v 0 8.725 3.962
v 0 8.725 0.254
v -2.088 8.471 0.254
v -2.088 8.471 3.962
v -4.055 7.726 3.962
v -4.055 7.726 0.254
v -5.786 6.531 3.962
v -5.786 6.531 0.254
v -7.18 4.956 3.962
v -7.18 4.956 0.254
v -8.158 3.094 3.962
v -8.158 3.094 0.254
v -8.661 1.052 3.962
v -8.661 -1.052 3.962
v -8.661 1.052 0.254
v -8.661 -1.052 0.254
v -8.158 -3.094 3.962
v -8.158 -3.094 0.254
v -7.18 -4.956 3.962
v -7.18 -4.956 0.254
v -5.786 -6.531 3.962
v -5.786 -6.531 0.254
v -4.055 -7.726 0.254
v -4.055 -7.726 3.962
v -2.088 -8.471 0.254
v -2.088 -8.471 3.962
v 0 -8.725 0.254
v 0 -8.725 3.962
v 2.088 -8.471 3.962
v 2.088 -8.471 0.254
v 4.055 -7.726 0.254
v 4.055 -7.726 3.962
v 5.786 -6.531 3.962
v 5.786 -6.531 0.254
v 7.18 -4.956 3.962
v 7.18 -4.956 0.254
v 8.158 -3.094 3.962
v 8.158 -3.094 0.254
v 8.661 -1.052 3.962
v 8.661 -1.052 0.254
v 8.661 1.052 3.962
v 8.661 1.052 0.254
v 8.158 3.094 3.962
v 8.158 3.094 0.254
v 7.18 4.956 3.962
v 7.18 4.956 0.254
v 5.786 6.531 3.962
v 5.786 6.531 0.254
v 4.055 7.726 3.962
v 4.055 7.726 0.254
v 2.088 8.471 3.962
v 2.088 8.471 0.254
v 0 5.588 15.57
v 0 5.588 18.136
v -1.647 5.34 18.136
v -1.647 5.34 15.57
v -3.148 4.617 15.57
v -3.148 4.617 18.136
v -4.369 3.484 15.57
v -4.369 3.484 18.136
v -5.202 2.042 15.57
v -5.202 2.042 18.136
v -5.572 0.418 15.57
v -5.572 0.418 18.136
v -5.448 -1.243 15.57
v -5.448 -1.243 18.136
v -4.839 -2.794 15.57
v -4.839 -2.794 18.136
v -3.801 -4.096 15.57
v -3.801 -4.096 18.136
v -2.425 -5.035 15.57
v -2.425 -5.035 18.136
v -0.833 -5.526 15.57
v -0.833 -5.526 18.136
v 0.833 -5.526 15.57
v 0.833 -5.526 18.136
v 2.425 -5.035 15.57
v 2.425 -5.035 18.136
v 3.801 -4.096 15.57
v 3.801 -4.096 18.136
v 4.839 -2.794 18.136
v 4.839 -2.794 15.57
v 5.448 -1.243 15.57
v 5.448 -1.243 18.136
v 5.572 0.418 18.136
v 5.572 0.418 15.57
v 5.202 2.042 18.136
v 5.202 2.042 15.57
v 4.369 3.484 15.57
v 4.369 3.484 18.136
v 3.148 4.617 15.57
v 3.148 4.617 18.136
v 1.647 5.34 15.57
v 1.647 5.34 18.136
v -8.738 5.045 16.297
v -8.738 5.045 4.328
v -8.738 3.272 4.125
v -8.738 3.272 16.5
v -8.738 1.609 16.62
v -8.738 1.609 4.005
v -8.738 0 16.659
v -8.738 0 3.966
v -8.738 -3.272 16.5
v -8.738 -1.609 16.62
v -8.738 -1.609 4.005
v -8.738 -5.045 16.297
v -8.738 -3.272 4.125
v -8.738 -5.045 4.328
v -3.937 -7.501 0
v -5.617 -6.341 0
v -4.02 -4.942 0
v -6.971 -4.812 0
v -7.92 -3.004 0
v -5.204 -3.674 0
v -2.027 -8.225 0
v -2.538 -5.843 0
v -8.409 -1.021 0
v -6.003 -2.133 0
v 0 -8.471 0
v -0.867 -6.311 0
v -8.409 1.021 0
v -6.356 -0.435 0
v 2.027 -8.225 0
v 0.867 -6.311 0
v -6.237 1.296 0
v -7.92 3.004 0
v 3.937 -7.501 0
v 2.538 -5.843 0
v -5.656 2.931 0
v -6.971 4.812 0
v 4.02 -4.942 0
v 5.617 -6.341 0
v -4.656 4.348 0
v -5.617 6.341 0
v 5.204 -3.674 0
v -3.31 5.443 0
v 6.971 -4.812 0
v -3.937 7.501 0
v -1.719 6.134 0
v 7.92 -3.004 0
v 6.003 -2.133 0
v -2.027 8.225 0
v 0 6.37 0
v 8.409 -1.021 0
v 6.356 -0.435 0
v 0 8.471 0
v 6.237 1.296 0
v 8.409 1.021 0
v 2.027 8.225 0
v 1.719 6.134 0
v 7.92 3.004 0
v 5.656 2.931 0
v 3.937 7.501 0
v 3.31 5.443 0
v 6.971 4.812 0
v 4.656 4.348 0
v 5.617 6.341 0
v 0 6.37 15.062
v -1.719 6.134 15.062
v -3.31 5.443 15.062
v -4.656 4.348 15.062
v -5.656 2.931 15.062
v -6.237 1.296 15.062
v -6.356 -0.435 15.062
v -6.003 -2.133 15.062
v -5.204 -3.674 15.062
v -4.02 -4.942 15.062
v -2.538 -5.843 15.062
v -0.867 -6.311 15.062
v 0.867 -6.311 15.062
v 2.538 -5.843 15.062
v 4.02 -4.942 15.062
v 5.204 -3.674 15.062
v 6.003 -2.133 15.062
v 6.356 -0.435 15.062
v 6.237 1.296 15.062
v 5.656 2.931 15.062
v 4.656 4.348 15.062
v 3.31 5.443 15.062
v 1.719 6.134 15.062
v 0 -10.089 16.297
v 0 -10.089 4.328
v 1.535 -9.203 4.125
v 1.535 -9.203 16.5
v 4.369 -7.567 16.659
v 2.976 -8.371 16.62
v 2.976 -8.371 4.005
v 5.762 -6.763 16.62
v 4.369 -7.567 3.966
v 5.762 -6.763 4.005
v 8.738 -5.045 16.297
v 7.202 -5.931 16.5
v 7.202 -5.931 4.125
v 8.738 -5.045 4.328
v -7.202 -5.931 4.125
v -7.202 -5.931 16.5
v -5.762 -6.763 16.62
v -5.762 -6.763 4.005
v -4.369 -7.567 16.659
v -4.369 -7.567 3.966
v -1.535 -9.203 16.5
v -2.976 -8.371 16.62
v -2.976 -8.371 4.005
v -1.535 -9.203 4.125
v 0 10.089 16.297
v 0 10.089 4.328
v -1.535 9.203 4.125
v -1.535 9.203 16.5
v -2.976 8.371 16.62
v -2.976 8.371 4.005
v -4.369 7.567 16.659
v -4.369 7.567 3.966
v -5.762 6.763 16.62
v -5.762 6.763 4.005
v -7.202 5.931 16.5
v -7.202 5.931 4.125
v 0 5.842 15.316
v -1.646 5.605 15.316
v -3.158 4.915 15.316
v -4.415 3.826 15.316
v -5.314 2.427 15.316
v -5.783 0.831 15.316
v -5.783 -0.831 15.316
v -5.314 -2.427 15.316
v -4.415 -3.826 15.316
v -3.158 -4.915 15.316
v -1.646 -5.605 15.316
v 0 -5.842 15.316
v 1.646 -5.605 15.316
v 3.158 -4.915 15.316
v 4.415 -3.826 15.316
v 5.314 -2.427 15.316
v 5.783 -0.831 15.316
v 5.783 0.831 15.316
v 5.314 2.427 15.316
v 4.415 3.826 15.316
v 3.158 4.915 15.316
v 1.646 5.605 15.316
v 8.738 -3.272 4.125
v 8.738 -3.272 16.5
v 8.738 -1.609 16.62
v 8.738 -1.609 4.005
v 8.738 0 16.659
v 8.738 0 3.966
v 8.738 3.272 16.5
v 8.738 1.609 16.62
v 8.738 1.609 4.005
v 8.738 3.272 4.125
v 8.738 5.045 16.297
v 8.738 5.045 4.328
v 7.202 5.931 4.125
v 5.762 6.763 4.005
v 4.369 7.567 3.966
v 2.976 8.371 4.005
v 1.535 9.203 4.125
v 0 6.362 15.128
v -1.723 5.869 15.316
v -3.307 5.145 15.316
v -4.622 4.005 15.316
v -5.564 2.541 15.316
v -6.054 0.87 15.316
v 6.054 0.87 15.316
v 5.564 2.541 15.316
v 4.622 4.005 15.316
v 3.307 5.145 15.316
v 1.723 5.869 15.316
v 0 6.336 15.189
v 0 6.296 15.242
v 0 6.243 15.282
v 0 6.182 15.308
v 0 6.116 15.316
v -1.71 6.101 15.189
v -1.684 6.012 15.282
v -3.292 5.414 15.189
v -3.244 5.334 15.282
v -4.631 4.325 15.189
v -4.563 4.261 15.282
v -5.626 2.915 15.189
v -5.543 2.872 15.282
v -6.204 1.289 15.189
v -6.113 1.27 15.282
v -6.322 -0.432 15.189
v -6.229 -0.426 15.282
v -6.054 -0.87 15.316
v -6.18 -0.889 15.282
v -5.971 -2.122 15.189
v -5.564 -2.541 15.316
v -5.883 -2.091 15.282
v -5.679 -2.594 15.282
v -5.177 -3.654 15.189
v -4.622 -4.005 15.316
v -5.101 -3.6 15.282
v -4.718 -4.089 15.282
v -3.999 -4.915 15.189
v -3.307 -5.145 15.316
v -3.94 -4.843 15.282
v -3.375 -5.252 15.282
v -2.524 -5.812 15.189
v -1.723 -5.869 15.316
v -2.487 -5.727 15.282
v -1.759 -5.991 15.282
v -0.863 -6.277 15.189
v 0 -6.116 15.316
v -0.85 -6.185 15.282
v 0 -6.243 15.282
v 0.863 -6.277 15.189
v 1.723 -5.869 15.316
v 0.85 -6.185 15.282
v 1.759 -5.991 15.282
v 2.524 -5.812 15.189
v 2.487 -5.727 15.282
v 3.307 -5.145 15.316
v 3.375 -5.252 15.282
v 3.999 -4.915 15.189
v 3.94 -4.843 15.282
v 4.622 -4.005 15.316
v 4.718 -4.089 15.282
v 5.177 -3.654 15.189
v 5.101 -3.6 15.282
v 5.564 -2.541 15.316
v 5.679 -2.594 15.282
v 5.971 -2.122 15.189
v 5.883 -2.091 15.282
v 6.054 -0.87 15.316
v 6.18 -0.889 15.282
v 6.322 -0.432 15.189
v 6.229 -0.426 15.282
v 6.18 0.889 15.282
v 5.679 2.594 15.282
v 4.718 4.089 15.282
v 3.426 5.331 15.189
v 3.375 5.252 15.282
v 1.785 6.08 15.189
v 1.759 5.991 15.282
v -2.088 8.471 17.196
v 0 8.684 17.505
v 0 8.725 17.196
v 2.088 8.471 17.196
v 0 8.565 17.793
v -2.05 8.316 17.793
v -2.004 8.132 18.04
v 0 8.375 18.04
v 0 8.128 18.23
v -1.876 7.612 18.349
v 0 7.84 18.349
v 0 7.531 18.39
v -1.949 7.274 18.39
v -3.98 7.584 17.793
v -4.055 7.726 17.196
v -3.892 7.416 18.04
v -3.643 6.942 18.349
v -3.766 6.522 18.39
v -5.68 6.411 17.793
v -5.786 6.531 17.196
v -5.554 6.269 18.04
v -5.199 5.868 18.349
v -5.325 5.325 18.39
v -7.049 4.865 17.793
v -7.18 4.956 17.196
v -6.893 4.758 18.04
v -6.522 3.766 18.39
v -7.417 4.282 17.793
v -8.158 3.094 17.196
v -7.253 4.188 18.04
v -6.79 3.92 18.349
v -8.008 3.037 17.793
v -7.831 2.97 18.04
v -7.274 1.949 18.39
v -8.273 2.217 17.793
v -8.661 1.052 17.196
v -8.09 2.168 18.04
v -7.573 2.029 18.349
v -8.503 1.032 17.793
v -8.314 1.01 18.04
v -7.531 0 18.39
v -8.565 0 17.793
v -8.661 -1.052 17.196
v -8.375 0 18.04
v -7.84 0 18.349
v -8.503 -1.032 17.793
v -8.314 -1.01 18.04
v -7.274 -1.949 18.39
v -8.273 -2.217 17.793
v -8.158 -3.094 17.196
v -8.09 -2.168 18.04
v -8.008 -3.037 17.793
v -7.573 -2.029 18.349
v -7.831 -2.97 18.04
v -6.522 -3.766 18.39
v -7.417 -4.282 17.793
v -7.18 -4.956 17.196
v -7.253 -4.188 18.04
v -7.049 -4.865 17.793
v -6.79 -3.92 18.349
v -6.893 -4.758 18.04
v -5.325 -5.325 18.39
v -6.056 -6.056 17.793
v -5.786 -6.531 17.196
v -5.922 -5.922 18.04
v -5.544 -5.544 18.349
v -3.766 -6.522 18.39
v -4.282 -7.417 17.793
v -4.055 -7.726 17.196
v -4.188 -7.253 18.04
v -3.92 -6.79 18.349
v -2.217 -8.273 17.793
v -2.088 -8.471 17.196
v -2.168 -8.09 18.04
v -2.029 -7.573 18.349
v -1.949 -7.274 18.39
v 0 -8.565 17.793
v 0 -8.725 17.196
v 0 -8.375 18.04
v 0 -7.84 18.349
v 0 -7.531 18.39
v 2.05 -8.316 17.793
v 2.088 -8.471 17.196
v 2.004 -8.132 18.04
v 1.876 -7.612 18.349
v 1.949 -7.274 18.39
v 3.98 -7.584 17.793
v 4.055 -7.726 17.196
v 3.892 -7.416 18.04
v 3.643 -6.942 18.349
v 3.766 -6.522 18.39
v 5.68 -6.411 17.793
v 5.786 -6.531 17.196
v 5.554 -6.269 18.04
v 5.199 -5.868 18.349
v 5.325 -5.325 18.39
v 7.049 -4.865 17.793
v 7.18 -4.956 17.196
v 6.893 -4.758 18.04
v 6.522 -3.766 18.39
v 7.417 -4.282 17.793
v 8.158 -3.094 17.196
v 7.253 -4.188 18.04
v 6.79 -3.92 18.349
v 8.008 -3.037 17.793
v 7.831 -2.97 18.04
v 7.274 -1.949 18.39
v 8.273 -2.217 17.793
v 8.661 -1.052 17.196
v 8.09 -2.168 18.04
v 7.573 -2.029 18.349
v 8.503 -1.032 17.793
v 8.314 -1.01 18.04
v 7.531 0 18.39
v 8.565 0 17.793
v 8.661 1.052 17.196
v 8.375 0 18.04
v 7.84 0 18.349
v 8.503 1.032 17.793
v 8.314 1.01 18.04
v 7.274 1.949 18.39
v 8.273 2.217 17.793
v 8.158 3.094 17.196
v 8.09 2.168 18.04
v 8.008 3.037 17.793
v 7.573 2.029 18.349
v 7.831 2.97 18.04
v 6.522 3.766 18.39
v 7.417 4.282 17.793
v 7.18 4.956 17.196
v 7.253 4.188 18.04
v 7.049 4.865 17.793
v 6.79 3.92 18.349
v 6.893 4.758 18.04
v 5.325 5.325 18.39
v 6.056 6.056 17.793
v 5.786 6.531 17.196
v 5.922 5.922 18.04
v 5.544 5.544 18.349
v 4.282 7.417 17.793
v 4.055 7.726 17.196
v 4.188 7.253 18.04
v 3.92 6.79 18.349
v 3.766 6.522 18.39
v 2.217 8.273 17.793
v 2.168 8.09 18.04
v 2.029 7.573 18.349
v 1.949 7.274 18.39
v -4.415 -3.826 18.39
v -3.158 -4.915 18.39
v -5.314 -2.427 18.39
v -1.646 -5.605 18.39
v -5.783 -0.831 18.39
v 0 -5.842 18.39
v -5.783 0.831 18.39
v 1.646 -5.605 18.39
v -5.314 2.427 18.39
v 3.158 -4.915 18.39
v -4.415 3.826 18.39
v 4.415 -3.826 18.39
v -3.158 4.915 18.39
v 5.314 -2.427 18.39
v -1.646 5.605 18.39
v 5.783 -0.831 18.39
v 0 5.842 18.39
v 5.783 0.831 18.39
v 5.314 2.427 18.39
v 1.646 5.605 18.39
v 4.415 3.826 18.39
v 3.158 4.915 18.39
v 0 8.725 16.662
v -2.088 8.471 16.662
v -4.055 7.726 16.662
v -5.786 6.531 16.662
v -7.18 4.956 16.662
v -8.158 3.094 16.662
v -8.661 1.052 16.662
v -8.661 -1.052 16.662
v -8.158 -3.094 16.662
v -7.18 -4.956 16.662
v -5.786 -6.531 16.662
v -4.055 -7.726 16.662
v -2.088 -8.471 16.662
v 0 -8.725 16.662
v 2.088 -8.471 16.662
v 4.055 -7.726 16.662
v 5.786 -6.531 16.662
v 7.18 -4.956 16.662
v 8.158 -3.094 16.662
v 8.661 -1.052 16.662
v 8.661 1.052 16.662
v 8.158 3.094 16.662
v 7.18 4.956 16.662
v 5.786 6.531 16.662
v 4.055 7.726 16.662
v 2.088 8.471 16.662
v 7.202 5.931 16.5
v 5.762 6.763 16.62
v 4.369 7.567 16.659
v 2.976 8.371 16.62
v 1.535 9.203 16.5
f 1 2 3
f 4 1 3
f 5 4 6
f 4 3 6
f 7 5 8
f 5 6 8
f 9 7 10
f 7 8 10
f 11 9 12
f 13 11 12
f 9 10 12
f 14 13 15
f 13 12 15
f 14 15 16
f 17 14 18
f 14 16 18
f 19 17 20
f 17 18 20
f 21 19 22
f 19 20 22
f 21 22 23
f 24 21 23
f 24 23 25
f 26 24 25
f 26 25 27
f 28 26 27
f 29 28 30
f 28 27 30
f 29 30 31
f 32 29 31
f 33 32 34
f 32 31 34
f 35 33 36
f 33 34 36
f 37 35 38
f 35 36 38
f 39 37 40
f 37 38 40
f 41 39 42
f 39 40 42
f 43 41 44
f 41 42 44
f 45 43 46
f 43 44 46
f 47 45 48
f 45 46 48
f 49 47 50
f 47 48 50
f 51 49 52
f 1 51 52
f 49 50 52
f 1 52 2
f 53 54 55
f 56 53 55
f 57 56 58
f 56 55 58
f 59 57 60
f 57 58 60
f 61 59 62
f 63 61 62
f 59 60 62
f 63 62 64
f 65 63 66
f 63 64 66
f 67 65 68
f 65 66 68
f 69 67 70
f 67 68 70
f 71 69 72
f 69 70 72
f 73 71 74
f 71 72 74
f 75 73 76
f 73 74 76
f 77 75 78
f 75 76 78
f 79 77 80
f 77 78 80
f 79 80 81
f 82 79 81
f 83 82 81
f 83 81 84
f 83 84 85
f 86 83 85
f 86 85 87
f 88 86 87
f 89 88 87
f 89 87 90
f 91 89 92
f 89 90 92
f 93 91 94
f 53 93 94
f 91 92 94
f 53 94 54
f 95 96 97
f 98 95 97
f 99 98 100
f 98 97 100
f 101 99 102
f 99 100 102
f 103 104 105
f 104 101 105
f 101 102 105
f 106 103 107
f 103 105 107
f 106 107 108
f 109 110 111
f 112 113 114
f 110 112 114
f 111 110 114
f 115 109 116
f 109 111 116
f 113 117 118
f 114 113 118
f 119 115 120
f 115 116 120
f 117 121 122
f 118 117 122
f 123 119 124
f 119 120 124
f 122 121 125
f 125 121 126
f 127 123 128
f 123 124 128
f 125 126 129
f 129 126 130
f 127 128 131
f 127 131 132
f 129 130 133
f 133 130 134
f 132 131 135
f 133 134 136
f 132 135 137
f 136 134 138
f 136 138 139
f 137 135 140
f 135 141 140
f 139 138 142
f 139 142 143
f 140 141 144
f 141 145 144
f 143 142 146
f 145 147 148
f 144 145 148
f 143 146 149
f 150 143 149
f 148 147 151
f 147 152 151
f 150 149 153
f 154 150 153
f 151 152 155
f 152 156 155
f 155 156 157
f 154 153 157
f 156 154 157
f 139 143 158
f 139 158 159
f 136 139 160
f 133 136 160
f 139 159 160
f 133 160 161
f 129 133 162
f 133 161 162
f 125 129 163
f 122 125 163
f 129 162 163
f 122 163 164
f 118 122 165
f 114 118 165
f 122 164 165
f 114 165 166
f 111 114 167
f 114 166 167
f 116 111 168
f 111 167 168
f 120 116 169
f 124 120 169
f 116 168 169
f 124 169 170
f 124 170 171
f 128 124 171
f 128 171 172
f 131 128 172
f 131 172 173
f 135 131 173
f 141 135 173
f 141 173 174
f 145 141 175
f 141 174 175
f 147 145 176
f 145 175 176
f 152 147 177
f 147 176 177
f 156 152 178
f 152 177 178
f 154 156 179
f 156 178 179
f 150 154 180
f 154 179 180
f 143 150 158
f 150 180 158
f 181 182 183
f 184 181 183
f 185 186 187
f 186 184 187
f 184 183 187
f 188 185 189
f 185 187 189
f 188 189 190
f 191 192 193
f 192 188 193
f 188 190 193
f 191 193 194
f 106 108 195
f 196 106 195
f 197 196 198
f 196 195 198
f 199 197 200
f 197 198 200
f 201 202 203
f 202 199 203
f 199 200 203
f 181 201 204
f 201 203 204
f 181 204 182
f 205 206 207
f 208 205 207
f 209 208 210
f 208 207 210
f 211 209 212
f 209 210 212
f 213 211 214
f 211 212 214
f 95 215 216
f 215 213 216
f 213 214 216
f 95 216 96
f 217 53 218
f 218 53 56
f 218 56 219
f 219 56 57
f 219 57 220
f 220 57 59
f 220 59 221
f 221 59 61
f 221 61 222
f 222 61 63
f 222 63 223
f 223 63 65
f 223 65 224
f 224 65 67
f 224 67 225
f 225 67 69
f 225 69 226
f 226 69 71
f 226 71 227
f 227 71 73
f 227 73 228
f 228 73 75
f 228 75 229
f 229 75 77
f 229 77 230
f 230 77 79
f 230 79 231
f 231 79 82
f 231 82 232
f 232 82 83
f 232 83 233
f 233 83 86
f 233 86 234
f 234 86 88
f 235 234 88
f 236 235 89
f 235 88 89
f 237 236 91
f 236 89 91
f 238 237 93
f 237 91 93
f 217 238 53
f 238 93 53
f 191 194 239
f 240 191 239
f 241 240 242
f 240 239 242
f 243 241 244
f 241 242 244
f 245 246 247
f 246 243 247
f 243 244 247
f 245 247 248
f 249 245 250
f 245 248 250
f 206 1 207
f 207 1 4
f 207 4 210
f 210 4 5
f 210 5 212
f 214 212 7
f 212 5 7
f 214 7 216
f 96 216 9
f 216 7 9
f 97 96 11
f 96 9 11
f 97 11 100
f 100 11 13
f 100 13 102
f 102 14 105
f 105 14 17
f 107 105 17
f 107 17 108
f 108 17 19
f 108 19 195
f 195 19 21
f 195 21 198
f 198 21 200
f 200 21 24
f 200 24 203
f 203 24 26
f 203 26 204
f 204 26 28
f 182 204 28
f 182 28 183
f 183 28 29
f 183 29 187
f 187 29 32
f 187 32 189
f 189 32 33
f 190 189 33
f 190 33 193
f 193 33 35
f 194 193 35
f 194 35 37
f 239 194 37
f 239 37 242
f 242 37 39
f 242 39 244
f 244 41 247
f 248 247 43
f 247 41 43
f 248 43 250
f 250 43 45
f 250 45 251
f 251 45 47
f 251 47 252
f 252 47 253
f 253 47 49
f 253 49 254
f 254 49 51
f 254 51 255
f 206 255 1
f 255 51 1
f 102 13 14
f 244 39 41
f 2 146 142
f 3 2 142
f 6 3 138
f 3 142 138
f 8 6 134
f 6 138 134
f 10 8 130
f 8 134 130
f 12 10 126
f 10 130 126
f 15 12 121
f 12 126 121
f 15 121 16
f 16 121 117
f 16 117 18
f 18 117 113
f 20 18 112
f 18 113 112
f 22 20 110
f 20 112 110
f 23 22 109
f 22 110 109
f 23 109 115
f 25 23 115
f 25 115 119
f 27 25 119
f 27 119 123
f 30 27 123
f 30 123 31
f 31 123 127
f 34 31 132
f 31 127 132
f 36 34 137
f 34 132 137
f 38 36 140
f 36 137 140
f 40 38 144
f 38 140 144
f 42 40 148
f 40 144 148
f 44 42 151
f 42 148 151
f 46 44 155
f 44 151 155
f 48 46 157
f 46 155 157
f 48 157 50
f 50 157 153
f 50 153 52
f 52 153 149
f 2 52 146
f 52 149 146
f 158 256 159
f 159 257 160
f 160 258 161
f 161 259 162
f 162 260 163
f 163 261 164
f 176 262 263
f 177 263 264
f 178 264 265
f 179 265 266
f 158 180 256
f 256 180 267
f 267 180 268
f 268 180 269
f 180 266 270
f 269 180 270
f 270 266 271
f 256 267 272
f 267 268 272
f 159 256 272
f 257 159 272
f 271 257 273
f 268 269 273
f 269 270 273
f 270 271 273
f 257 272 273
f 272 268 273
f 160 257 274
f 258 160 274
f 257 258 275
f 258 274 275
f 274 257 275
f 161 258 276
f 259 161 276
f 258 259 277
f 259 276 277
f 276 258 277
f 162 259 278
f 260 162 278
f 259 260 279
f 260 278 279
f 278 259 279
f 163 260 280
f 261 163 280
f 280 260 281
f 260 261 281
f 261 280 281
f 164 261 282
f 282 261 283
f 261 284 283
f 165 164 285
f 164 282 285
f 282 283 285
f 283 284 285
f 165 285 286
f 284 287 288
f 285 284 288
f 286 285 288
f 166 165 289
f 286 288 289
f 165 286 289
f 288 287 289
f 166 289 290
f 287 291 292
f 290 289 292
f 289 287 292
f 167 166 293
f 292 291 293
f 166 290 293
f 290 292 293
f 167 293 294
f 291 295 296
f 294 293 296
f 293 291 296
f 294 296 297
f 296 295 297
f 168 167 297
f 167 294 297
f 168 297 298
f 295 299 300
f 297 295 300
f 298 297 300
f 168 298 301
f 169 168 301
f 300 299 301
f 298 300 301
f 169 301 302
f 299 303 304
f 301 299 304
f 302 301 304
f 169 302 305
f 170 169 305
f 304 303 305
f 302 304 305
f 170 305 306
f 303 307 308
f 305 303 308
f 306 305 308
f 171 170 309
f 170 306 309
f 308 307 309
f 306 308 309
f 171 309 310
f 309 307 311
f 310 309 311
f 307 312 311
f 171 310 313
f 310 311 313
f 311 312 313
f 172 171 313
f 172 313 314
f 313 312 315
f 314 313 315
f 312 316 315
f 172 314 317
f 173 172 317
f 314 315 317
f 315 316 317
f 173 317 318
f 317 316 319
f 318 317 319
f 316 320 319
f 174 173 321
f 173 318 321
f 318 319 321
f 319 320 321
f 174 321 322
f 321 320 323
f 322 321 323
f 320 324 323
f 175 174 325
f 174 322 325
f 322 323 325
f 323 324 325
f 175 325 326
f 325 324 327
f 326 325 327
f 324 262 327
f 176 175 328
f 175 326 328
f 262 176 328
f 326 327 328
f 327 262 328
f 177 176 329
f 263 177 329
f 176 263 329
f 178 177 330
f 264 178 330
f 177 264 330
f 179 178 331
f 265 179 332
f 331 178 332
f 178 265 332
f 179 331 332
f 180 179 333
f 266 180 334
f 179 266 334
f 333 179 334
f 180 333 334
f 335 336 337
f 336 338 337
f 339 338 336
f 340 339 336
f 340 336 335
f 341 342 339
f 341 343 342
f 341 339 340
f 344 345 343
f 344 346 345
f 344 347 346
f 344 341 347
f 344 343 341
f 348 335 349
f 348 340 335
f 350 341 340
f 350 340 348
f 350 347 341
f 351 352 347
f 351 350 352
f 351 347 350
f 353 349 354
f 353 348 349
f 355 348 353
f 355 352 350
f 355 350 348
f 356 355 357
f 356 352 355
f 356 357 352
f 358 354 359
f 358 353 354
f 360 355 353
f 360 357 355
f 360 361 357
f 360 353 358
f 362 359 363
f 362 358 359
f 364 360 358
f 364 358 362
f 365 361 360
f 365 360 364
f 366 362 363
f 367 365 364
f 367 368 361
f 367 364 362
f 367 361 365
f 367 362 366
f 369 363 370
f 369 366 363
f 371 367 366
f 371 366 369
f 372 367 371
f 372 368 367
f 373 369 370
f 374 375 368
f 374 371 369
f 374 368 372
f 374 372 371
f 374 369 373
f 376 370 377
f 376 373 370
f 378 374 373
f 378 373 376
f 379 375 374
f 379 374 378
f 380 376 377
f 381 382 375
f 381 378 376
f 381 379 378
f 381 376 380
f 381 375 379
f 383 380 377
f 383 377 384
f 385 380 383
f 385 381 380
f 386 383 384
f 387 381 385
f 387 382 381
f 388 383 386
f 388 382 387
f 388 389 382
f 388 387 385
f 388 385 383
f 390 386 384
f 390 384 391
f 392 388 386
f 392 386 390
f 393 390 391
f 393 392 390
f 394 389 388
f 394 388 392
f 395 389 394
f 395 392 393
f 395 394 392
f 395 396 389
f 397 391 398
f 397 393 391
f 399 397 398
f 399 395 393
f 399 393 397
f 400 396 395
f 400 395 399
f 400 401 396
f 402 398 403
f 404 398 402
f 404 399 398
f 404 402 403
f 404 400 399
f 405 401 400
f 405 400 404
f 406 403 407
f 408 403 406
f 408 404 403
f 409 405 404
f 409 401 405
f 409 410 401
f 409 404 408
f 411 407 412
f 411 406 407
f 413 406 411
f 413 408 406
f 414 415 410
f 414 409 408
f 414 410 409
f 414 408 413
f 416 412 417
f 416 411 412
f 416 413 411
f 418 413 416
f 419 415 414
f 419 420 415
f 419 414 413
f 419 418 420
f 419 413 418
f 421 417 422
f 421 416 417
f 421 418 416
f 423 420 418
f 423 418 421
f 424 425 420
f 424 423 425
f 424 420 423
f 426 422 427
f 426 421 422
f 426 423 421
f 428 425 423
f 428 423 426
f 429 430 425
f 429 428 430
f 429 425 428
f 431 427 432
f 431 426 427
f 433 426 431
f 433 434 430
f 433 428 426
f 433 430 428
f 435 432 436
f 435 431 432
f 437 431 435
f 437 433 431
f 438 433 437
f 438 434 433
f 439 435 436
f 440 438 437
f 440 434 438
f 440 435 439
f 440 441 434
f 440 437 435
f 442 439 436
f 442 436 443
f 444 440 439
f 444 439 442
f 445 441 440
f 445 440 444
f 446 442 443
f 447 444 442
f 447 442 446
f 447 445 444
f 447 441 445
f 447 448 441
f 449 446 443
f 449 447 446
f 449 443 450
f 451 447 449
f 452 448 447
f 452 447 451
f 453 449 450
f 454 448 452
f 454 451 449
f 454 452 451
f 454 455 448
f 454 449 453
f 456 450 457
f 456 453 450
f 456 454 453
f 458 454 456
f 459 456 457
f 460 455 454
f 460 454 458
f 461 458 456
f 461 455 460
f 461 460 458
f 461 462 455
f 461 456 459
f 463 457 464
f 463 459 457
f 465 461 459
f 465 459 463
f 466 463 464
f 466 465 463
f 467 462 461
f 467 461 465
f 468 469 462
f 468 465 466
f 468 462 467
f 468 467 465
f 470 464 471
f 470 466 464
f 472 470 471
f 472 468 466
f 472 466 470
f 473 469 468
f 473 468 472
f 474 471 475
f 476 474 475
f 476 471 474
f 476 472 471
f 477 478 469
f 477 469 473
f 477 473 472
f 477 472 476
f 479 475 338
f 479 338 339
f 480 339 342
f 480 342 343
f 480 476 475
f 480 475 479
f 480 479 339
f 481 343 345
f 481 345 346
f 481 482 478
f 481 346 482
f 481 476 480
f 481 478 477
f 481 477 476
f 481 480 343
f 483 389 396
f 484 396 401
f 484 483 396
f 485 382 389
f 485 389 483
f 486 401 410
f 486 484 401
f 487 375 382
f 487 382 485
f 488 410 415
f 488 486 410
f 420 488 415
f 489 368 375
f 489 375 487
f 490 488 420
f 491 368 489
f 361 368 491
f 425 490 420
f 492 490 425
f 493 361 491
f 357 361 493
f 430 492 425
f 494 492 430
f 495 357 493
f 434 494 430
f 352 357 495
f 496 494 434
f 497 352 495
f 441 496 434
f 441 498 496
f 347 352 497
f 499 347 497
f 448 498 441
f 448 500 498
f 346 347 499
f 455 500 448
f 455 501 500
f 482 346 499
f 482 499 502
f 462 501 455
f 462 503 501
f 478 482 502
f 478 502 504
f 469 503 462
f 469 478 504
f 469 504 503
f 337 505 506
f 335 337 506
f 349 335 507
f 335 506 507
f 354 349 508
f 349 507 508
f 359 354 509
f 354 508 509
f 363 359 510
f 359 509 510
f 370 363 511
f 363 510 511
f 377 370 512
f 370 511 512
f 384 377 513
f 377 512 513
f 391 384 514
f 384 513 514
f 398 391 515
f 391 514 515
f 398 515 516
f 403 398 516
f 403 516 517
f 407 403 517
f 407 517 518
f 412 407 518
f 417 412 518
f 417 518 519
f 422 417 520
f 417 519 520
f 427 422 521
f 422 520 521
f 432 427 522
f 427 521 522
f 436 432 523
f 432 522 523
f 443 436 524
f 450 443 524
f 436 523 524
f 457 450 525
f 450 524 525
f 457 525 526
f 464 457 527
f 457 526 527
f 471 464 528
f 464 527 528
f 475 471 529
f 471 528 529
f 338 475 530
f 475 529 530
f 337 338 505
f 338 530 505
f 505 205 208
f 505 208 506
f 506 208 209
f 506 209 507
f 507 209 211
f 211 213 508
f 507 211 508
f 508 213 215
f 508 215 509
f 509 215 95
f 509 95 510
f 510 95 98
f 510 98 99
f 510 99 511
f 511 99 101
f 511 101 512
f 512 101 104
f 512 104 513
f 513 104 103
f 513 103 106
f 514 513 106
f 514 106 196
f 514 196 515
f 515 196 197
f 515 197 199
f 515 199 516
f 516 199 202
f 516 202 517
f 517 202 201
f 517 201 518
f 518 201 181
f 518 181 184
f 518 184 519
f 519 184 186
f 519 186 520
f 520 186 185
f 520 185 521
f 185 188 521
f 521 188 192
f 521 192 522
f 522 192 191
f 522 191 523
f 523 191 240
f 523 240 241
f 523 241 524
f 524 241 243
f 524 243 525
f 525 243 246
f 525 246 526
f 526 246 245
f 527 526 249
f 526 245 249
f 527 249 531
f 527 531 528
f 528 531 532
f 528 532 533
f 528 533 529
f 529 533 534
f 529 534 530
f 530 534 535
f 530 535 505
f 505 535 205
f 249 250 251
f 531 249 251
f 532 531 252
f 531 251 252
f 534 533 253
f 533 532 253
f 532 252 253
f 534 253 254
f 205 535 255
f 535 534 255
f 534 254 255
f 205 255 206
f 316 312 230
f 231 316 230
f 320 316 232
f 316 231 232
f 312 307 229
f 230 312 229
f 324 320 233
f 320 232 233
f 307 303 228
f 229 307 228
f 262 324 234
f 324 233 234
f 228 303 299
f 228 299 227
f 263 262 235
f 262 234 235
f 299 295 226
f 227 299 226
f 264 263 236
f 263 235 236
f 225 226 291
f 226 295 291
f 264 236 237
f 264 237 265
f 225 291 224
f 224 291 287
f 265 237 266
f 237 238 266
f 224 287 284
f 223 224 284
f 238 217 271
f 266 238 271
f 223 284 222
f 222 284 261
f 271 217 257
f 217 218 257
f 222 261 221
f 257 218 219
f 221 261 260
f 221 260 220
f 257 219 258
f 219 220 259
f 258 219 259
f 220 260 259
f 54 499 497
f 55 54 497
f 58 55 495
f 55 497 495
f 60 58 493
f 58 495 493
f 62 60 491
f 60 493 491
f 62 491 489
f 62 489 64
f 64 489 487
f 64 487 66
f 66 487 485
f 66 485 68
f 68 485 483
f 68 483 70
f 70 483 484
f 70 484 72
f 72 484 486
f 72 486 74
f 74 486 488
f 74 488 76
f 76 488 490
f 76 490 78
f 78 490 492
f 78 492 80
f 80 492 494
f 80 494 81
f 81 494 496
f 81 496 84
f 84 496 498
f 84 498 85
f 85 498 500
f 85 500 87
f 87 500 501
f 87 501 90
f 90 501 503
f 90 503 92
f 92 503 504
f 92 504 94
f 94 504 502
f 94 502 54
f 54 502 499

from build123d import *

# Parameters (mm, degrees)
BOSS_EXTRUDE1_DEPTH = 18.3896
FILLET1_R           = 1.1938
CHAMFER1_SIZE       = 0.254
CHAMFER2_SIZE       = 0.254


with BuildPart() as part:
    # Sketch1 → Boss-Extrude1 (new body)
    with BuildSketch(Plane.XY):
        Polygon((0, 10.089311424), (-8.7376, 5.044655712), (-8.7376, -5.044655712), (0, -10.089311424), (8.7376, -5.044655712), (8.7376, 5.044655712), align=None)
    extrude(amount=BOSS_EXTRUDE1_DEPTH)

    # Sketch2 → Cut-Revolve1 (revolve, cut)
    with BuildSketch(Plane(origin=(0, 0, 0), x_dir=(0, 0, -1), z_dir=(1, 0, 0))):
        Polygon((-18.3896, 11.453722848), (-18.3896, 8.7249), (-16.6624, 8.7249), (-16.296807061, 10.089311424), (-4.327992939, 10.089311424), (-3.9624, 8.7249), (0, 8.7249), (0, 11.453722848), align=None)
        with BuildLine():
            Line((-18.3896, 5.588), (-18.3896, 0))
            Line((-18.3896, 0), (0, 0))
            Line((0, 0), (0, 6.370416378))
            Line((0, 6.370416378), (-15.0622, 6.370416378))
            ThreePointArc((-15.0622, 6.370416378), (-15.241805122, 6.2960215), (-15.3162, 6.116416378))
            Line((-15.3162, 6.116416378), (-15.3162, 5.588))
            Line((-15.3162, 5.588), (-18.3896, 5.588))
        make_face()
    revolve(axis=Axis((0, 0, 0), (0, 0, 1)), mode=Mode.SUBTRACT)

    # Fillet1
    fillet1_edges = [part.edges().sort_by_distance(p)[0] for p in [
        (0, -8.7249, 18.3896),
    ]]
    fillet(fillet1_edges, radius=FILLET1_R)

    # Chamfer1
    chamfer1_edges = [part.edges().sort_by_distance(p)[0] for p in [
        (0, -8.7249, 0),
    ]]
    chamfer(chamfer1_edges, length=CHAMFER1_SIZE)

    # Chamfer2
    chamfer2_edges = [part.edges().sort_by_distance(p)[0] for p in [
        (0, -5.588, 18.3896),
        (0, -5.588, 15.3162),
    ]]
    chamfer(chamfer2_edges, length=CHAMFER2_SIZE)


solid = part.part
